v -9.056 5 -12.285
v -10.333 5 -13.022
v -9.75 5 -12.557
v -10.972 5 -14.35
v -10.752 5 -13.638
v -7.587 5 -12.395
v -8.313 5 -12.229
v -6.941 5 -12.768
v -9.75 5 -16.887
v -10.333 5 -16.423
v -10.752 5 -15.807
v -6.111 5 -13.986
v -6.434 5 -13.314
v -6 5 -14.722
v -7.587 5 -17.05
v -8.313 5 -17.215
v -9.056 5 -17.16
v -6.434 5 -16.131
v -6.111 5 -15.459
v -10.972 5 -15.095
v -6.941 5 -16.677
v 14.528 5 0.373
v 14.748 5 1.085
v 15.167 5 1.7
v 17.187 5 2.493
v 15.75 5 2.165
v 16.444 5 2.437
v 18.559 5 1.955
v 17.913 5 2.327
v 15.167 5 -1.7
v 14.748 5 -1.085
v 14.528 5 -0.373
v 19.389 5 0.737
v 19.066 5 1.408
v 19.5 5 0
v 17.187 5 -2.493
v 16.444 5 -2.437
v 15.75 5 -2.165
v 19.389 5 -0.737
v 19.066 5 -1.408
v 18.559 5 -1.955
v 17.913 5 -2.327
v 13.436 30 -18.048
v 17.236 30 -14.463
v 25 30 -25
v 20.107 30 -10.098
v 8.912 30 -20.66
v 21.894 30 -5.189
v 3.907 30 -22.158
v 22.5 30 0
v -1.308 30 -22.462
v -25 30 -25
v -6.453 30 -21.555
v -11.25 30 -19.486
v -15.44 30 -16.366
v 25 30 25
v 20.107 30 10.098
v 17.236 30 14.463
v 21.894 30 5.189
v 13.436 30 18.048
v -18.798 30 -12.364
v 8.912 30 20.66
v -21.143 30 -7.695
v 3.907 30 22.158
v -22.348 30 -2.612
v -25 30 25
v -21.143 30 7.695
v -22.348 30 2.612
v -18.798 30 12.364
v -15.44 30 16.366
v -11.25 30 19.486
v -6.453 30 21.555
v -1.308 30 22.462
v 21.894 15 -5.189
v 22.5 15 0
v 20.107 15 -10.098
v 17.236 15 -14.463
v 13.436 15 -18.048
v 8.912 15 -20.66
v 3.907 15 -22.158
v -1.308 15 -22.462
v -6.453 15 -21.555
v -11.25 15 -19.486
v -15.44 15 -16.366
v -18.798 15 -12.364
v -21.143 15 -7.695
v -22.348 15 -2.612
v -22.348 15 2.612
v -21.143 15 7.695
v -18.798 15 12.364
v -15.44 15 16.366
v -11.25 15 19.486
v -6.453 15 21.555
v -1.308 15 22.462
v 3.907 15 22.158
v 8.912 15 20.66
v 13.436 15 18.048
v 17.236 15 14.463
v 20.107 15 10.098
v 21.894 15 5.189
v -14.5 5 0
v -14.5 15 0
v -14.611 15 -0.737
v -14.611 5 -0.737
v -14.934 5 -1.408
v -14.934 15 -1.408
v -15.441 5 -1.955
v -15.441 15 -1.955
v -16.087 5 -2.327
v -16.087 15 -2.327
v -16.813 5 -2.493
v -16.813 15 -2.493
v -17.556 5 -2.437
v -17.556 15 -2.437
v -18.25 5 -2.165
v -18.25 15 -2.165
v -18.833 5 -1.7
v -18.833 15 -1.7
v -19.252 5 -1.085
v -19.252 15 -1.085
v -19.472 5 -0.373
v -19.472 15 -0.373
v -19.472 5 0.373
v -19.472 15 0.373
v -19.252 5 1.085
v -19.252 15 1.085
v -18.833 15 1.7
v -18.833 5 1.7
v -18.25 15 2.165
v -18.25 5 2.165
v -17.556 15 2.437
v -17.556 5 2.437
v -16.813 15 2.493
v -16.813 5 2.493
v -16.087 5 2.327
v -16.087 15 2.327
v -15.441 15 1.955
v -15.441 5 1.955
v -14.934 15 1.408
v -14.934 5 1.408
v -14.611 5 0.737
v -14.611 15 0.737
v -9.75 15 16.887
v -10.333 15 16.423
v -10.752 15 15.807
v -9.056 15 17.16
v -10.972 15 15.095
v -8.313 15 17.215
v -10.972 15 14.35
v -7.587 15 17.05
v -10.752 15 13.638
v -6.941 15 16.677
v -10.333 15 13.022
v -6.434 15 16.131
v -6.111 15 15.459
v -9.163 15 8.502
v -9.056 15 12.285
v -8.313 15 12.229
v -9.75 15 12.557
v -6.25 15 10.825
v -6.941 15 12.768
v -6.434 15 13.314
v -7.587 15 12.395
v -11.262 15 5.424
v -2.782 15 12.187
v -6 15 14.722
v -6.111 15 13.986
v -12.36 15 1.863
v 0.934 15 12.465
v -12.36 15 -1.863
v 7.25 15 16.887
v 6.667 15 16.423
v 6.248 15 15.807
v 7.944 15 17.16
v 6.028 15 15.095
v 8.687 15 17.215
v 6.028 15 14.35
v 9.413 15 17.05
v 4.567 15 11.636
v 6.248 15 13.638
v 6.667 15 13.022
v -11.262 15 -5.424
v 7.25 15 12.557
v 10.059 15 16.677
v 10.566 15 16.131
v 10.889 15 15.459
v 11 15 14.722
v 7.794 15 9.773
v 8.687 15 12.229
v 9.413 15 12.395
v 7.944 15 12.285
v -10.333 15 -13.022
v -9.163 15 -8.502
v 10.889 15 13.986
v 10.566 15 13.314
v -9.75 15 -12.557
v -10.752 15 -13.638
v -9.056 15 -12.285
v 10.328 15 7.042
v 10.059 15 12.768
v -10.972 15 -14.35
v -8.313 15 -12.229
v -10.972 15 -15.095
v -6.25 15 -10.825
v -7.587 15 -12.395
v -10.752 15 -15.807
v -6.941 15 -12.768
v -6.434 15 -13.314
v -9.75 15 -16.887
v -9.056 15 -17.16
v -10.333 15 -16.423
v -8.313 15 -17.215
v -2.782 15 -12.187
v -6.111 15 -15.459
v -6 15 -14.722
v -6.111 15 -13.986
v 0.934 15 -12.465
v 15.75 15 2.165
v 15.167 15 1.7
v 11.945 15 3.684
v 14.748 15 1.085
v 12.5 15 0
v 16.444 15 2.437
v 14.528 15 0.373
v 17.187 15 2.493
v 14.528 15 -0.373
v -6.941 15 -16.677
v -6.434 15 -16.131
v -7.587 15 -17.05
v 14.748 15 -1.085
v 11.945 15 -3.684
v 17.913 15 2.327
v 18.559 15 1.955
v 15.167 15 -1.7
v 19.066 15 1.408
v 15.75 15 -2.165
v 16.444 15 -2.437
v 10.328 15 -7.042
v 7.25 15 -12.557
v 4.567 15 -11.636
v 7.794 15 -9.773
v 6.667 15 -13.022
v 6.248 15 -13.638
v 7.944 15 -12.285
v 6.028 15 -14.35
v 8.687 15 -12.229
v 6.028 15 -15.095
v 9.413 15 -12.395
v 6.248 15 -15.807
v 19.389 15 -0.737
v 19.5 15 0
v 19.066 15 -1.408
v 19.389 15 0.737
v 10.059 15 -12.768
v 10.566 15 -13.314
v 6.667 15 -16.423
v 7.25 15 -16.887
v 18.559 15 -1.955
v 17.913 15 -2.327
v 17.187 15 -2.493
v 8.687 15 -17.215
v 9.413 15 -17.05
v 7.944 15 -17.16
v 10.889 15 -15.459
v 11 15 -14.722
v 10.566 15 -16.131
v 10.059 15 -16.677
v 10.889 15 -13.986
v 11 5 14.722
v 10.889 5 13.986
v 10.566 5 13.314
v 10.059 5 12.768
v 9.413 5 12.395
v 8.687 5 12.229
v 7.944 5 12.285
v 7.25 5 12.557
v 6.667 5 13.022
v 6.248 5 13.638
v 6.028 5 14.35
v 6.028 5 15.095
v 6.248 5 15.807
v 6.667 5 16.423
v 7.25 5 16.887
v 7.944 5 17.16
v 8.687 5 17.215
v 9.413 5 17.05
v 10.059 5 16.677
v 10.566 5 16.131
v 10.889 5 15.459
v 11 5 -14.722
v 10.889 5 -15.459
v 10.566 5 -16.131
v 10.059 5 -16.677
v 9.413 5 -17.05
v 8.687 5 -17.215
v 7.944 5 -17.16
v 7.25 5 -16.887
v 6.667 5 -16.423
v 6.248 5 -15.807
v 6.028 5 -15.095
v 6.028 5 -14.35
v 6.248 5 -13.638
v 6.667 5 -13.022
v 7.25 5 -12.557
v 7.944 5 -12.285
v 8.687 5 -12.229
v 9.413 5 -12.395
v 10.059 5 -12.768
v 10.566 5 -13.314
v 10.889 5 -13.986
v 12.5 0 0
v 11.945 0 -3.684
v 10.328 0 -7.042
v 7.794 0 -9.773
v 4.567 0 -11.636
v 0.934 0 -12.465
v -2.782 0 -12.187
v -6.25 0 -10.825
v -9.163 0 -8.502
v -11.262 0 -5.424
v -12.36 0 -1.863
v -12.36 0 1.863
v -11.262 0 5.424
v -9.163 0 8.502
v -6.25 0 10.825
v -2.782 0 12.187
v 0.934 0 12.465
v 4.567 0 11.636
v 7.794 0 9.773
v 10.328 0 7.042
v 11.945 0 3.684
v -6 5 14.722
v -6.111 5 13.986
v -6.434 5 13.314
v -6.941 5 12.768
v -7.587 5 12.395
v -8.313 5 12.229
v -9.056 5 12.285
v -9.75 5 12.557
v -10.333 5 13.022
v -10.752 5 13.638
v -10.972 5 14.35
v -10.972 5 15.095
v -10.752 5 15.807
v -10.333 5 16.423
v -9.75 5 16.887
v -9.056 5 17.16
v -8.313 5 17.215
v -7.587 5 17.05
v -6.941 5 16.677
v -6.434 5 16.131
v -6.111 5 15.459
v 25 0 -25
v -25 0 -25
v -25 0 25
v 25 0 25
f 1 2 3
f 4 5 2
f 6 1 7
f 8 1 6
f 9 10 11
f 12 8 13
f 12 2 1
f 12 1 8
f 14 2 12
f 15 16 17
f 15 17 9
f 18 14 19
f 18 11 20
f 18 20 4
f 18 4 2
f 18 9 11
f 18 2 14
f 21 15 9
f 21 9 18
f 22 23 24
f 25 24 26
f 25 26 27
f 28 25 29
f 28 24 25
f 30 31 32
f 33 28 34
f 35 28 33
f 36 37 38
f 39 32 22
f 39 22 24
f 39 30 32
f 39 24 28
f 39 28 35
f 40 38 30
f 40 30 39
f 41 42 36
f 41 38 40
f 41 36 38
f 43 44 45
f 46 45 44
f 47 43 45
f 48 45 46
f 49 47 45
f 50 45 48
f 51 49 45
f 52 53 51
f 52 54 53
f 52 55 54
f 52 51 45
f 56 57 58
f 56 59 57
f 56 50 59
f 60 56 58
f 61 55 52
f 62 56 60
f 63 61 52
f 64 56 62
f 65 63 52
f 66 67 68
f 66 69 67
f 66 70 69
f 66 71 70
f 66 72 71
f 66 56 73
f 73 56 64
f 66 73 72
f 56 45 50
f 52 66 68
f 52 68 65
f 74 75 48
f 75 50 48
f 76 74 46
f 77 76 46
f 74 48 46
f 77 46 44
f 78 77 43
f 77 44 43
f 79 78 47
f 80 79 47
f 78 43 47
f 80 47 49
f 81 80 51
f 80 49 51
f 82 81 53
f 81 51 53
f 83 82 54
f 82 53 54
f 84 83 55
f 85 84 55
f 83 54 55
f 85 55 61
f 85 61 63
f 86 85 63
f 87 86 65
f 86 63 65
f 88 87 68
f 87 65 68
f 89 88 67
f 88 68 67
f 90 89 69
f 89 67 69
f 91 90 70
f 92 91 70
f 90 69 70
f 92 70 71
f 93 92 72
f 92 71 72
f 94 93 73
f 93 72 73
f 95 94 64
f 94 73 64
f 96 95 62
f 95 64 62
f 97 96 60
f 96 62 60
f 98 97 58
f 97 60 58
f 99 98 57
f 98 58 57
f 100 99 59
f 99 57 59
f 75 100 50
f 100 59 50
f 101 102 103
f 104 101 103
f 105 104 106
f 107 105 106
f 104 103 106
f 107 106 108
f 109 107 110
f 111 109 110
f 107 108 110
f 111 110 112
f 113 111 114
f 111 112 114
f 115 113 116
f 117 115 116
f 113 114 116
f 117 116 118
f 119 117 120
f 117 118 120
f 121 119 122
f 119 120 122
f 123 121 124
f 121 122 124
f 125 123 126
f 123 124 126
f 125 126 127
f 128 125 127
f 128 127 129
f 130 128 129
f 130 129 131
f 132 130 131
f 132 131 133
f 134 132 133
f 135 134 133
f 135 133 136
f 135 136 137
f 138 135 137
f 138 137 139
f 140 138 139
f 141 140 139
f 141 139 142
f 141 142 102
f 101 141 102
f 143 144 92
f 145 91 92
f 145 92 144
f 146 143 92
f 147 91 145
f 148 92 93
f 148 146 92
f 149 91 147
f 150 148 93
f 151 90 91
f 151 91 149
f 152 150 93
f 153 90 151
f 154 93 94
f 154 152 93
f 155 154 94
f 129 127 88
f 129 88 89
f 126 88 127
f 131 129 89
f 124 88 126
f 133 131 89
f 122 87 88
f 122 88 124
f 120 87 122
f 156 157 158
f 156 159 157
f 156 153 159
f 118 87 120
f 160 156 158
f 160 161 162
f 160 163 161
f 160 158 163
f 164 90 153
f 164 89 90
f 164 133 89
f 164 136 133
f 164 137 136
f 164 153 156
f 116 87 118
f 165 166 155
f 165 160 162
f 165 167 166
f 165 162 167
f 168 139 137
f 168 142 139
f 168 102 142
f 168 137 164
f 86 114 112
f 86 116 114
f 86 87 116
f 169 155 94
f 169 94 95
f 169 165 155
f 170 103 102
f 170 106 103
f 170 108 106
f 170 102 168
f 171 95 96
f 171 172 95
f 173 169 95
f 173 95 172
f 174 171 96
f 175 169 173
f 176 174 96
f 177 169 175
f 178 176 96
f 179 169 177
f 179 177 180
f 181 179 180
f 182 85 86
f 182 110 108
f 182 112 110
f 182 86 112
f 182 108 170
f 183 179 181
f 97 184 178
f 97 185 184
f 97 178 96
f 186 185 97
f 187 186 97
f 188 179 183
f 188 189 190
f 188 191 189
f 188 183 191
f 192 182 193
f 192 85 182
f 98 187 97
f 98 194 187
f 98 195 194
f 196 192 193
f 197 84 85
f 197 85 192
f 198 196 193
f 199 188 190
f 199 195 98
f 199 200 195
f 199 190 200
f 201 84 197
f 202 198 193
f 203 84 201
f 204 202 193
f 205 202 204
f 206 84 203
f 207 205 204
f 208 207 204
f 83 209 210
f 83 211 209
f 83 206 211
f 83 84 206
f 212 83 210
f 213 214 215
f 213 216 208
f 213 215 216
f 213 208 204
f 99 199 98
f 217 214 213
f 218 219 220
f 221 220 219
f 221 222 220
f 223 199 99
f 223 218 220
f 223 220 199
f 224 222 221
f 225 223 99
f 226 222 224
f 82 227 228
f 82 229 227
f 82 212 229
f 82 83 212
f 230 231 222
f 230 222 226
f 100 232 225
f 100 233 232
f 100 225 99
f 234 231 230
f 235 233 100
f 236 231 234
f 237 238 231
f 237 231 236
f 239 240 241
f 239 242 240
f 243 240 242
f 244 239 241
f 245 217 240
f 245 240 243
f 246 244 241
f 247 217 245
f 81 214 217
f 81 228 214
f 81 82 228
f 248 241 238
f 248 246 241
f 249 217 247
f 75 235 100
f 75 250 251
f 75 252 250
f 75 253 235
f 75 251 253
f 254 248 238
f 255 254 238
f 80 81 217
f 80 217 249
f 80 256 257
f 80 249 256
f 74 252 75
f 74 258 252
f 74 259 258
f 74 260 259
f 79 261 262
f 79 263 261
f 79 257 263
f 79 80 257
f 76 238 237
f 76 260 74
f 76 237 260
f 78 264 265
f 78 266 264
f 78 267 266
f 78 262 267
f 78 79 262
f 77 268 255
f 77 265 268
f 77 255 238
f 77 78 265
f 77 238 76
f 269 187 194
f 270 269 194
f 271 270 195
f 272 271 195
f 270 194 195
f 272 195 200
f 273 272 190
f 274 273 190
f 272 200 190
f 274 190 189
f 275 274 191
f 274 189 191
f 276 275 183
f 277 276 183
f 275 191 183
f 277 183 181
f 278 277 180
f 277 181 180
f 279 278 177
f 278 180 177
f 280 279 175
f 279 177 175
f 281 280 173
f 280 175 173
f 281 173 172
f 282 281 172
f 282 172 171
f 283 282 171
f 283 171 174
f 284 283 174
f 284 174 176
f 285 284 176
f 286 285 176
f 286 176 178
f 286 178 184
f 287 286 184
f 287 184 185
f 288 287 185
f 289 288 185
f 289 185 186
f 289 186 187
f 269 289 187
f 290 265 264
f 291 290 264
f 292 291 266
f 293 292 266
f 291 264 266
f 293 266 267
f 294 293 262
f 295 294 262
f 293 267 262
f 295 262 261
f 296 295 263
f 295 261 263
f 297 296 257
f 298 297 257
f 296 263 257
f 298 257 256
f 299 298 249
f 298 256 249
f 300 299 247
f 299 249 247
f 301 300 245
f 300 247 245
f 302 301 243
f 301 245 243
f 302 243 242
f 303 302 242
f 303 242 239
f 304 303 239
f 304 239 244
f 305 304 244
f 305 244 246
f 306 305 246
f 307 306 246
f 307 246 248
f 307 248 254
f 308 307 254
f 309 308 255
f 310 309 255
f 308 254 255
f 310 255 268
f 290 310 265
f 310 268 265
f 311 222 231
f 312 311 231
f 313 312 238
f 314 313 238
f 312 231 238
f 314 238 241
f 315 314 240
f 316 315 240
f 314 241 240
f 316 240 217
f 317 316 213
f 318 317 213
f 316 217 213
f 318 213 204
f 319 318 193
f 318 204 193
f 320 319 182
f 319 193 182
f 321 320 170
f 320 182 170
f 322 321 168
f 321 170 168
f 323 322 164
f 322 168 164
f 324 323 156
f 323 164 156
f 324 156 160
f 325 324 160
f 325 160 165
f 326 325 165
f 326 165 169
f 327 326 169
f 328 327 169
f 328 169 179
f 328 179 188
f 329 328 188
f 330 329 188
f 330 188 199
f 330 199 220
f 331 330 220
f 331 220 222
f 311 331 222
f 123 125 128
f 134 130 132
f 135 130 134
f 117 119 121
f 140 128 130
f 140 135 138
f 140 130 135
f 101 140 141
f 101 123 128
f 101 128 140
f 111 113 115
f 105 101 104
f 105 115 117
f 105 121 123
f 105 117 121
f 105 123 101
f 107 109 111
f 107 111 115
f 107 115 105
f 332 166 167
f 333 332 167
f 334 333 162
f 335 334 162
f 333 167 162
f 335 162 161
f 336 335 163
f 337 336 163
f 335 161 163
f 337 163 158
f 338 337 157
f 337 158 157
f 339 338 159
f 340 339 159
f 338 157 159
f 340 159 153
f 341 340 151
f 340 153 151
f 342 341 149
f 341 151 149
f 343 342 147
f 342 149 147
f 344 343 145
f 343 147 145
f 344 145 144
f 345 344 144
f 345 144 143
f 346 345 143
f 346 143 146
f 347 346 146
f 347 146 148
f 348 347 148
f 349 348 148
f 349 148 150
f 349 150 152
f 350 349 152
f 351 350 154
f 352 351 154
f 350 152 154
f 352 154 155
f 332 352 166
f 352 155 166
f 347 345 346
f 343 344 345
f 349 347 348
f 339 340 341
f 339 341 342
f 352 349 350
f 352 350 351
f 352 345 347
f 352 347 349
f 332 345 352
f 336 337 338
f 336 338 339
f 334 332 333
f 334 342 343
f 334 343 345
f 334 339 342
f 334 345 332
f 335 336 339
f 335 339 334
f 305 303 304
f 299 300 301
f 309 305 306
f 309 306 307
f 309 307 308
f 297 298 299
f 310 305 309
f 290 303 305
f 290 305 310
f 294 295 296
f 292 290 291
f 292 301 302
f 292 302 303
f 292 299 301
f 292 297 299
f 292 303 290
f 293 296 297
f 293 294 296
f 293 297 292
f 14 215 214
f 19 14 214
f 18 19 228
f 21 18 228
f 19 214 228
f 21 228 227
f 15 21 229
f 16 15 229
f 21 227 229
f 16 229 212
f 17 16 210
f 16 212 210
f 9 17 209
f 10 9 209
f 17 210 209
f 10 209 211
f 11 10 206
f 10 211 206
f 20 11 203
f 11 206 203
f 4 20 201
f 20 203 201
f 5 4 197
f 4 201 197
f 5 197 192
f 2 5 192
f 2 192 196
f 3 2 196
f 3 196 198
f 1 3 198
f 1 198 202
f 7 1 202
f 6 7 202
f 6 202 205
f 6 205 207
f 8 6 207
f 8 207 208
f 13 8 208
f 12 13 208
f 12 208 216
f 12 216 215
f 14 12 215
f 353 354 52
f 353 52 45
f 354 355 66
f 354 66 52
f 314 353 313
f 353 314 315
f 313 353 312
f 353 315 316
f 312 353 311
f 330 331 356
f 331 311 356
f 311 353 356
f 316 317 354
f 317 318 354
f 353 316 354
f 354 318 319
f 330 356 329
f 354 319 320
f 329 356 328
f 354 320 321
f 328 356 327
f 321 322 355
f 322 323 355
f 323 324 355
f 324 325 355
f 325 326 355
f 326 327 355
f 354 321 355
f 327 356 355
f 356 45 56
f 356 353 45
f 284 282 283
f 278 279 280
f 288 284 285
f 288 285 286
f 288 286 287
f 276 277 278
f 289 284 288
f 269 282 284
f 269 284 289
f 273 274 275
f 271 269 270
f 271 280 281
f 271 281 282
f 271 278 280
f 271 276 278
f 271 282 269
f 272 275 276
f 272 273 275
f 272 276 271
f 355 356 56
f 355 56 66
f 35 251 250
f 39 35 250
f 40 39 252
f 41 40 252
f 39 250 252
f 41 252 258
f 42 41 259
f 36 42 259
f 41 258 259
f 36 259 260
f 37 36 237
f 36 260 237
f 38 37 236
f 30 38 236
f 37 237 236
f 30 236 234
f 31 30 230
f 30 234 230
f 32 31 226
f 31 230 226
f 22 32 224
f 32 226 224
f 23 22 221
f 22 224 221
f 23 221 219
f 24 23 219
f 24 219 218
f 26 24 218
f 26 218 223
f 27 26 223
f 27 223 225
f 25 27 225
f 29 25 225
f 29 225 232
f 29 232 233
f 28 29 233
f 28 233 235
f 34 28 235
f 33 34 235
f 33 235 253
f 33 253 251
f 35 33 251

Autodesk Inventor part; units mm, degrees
ref_plane "YZ Plane" through (0, 0, 0) normal (1, 0, 0) x (0, 1, 0)
ref_plane "XZ Plane" through (0, 0, 0) normal (0, 1, 0) x (-1, 0, 0)
ref_plane "XY Plane" through (0, 0, 0) normal (0, 0, 1) x (1, 0, 0)
sketch "Szkic1" plane through (0, 0, 0) normal (0, 1, 0) x (-1, 0, 0)
  line L0 (-25, 25) -> (25, 25)
  line L1 (25, 25) -> (25, -25)
  line L2 (25, -25) -> (-25, -25)
  line L3 (-25, -25) -> (-25, 25)
  line L4 (-25, 25) -> (25, -25) construction
  line L5 (25, 25) -> (-25, -25) construction
  point P0 (0, 0)
  dimension "d0" = 50
  dimension "d1" = 50
extrude "Wyciągnięcie proste1" add sketch "Szkic1" along normal blind 30
sketch "Szkic2" plane through (0, 30, 0) normal (0, 1, 0) x (1, 0, 0)
  circle A0 centre (0, 0) radius 12.5
  dimension "d4" = 25
extrude "Wyciągnięcie proste2" cut sketch "Szkic2" against normal up to next
sketch "Szkic3" plane through (0, 30, 0) normal (0, 1, 0) x (1, 0, 0)
  circle A0 centre (0, 0) radius 22.5
  dimension "d7" = 45
extrude "Wyciągnięcie proste3" cut sketch "Szkic3" against normal blind 15
sketch "Szkic4" plane through (0, 15, 0) normal (0, 1, 0) x (1, 0, 0)
  circle A0 centre (0, 0) radius 12.25
  circle A1 centre (0, 0) radius 21
  circle A2 centre (-17, 0) radius 2.5
  circle A3 centre (-8.5, -14.7224) radius 2.5
  circle A4 centre (8.5, -14.7224) radius 2.5
  circle A5 centre (17, 0) radius 2.5
  circle A6 centre (8.5, 14.7224) radius 2.5
  circle A7 centre (-8.5, 14.7224) radius 2.5
  dimension "d11" = 5
  dimension "d14" = 360
  dimension "d36" = 17
extrude "Wyciągnięcie proste4" cut sketch "Szkic4" against normal blind 10 contours A2 | A3 | A4 | A5 | A6 | A7
thread "Gwint1" size "M5x0.8" class "6H" standard "ANSI Metric M Profile" full length
thread "Gwint2" size "M5x0.8" class "6H" standard "ANSI Metric M Profile" full length
thread "Gwint3" size "M5x0.8" class "6H" standard "ANSI Metric M Profile" full length
thread "Gwint4" size "M5x0.8" class "6H" standard "ANSI Metric M Profile" full length
thread "Gwint5" size "M5x0.8" class "6H" standard "ANSI Metric M Profile" full length
thread "Gwint6" size "M5x0.8" class "6H" standard "ANSI Metric M Profile" full length
properties part number "Obudowa nakrętki trapezowej fi 10"
